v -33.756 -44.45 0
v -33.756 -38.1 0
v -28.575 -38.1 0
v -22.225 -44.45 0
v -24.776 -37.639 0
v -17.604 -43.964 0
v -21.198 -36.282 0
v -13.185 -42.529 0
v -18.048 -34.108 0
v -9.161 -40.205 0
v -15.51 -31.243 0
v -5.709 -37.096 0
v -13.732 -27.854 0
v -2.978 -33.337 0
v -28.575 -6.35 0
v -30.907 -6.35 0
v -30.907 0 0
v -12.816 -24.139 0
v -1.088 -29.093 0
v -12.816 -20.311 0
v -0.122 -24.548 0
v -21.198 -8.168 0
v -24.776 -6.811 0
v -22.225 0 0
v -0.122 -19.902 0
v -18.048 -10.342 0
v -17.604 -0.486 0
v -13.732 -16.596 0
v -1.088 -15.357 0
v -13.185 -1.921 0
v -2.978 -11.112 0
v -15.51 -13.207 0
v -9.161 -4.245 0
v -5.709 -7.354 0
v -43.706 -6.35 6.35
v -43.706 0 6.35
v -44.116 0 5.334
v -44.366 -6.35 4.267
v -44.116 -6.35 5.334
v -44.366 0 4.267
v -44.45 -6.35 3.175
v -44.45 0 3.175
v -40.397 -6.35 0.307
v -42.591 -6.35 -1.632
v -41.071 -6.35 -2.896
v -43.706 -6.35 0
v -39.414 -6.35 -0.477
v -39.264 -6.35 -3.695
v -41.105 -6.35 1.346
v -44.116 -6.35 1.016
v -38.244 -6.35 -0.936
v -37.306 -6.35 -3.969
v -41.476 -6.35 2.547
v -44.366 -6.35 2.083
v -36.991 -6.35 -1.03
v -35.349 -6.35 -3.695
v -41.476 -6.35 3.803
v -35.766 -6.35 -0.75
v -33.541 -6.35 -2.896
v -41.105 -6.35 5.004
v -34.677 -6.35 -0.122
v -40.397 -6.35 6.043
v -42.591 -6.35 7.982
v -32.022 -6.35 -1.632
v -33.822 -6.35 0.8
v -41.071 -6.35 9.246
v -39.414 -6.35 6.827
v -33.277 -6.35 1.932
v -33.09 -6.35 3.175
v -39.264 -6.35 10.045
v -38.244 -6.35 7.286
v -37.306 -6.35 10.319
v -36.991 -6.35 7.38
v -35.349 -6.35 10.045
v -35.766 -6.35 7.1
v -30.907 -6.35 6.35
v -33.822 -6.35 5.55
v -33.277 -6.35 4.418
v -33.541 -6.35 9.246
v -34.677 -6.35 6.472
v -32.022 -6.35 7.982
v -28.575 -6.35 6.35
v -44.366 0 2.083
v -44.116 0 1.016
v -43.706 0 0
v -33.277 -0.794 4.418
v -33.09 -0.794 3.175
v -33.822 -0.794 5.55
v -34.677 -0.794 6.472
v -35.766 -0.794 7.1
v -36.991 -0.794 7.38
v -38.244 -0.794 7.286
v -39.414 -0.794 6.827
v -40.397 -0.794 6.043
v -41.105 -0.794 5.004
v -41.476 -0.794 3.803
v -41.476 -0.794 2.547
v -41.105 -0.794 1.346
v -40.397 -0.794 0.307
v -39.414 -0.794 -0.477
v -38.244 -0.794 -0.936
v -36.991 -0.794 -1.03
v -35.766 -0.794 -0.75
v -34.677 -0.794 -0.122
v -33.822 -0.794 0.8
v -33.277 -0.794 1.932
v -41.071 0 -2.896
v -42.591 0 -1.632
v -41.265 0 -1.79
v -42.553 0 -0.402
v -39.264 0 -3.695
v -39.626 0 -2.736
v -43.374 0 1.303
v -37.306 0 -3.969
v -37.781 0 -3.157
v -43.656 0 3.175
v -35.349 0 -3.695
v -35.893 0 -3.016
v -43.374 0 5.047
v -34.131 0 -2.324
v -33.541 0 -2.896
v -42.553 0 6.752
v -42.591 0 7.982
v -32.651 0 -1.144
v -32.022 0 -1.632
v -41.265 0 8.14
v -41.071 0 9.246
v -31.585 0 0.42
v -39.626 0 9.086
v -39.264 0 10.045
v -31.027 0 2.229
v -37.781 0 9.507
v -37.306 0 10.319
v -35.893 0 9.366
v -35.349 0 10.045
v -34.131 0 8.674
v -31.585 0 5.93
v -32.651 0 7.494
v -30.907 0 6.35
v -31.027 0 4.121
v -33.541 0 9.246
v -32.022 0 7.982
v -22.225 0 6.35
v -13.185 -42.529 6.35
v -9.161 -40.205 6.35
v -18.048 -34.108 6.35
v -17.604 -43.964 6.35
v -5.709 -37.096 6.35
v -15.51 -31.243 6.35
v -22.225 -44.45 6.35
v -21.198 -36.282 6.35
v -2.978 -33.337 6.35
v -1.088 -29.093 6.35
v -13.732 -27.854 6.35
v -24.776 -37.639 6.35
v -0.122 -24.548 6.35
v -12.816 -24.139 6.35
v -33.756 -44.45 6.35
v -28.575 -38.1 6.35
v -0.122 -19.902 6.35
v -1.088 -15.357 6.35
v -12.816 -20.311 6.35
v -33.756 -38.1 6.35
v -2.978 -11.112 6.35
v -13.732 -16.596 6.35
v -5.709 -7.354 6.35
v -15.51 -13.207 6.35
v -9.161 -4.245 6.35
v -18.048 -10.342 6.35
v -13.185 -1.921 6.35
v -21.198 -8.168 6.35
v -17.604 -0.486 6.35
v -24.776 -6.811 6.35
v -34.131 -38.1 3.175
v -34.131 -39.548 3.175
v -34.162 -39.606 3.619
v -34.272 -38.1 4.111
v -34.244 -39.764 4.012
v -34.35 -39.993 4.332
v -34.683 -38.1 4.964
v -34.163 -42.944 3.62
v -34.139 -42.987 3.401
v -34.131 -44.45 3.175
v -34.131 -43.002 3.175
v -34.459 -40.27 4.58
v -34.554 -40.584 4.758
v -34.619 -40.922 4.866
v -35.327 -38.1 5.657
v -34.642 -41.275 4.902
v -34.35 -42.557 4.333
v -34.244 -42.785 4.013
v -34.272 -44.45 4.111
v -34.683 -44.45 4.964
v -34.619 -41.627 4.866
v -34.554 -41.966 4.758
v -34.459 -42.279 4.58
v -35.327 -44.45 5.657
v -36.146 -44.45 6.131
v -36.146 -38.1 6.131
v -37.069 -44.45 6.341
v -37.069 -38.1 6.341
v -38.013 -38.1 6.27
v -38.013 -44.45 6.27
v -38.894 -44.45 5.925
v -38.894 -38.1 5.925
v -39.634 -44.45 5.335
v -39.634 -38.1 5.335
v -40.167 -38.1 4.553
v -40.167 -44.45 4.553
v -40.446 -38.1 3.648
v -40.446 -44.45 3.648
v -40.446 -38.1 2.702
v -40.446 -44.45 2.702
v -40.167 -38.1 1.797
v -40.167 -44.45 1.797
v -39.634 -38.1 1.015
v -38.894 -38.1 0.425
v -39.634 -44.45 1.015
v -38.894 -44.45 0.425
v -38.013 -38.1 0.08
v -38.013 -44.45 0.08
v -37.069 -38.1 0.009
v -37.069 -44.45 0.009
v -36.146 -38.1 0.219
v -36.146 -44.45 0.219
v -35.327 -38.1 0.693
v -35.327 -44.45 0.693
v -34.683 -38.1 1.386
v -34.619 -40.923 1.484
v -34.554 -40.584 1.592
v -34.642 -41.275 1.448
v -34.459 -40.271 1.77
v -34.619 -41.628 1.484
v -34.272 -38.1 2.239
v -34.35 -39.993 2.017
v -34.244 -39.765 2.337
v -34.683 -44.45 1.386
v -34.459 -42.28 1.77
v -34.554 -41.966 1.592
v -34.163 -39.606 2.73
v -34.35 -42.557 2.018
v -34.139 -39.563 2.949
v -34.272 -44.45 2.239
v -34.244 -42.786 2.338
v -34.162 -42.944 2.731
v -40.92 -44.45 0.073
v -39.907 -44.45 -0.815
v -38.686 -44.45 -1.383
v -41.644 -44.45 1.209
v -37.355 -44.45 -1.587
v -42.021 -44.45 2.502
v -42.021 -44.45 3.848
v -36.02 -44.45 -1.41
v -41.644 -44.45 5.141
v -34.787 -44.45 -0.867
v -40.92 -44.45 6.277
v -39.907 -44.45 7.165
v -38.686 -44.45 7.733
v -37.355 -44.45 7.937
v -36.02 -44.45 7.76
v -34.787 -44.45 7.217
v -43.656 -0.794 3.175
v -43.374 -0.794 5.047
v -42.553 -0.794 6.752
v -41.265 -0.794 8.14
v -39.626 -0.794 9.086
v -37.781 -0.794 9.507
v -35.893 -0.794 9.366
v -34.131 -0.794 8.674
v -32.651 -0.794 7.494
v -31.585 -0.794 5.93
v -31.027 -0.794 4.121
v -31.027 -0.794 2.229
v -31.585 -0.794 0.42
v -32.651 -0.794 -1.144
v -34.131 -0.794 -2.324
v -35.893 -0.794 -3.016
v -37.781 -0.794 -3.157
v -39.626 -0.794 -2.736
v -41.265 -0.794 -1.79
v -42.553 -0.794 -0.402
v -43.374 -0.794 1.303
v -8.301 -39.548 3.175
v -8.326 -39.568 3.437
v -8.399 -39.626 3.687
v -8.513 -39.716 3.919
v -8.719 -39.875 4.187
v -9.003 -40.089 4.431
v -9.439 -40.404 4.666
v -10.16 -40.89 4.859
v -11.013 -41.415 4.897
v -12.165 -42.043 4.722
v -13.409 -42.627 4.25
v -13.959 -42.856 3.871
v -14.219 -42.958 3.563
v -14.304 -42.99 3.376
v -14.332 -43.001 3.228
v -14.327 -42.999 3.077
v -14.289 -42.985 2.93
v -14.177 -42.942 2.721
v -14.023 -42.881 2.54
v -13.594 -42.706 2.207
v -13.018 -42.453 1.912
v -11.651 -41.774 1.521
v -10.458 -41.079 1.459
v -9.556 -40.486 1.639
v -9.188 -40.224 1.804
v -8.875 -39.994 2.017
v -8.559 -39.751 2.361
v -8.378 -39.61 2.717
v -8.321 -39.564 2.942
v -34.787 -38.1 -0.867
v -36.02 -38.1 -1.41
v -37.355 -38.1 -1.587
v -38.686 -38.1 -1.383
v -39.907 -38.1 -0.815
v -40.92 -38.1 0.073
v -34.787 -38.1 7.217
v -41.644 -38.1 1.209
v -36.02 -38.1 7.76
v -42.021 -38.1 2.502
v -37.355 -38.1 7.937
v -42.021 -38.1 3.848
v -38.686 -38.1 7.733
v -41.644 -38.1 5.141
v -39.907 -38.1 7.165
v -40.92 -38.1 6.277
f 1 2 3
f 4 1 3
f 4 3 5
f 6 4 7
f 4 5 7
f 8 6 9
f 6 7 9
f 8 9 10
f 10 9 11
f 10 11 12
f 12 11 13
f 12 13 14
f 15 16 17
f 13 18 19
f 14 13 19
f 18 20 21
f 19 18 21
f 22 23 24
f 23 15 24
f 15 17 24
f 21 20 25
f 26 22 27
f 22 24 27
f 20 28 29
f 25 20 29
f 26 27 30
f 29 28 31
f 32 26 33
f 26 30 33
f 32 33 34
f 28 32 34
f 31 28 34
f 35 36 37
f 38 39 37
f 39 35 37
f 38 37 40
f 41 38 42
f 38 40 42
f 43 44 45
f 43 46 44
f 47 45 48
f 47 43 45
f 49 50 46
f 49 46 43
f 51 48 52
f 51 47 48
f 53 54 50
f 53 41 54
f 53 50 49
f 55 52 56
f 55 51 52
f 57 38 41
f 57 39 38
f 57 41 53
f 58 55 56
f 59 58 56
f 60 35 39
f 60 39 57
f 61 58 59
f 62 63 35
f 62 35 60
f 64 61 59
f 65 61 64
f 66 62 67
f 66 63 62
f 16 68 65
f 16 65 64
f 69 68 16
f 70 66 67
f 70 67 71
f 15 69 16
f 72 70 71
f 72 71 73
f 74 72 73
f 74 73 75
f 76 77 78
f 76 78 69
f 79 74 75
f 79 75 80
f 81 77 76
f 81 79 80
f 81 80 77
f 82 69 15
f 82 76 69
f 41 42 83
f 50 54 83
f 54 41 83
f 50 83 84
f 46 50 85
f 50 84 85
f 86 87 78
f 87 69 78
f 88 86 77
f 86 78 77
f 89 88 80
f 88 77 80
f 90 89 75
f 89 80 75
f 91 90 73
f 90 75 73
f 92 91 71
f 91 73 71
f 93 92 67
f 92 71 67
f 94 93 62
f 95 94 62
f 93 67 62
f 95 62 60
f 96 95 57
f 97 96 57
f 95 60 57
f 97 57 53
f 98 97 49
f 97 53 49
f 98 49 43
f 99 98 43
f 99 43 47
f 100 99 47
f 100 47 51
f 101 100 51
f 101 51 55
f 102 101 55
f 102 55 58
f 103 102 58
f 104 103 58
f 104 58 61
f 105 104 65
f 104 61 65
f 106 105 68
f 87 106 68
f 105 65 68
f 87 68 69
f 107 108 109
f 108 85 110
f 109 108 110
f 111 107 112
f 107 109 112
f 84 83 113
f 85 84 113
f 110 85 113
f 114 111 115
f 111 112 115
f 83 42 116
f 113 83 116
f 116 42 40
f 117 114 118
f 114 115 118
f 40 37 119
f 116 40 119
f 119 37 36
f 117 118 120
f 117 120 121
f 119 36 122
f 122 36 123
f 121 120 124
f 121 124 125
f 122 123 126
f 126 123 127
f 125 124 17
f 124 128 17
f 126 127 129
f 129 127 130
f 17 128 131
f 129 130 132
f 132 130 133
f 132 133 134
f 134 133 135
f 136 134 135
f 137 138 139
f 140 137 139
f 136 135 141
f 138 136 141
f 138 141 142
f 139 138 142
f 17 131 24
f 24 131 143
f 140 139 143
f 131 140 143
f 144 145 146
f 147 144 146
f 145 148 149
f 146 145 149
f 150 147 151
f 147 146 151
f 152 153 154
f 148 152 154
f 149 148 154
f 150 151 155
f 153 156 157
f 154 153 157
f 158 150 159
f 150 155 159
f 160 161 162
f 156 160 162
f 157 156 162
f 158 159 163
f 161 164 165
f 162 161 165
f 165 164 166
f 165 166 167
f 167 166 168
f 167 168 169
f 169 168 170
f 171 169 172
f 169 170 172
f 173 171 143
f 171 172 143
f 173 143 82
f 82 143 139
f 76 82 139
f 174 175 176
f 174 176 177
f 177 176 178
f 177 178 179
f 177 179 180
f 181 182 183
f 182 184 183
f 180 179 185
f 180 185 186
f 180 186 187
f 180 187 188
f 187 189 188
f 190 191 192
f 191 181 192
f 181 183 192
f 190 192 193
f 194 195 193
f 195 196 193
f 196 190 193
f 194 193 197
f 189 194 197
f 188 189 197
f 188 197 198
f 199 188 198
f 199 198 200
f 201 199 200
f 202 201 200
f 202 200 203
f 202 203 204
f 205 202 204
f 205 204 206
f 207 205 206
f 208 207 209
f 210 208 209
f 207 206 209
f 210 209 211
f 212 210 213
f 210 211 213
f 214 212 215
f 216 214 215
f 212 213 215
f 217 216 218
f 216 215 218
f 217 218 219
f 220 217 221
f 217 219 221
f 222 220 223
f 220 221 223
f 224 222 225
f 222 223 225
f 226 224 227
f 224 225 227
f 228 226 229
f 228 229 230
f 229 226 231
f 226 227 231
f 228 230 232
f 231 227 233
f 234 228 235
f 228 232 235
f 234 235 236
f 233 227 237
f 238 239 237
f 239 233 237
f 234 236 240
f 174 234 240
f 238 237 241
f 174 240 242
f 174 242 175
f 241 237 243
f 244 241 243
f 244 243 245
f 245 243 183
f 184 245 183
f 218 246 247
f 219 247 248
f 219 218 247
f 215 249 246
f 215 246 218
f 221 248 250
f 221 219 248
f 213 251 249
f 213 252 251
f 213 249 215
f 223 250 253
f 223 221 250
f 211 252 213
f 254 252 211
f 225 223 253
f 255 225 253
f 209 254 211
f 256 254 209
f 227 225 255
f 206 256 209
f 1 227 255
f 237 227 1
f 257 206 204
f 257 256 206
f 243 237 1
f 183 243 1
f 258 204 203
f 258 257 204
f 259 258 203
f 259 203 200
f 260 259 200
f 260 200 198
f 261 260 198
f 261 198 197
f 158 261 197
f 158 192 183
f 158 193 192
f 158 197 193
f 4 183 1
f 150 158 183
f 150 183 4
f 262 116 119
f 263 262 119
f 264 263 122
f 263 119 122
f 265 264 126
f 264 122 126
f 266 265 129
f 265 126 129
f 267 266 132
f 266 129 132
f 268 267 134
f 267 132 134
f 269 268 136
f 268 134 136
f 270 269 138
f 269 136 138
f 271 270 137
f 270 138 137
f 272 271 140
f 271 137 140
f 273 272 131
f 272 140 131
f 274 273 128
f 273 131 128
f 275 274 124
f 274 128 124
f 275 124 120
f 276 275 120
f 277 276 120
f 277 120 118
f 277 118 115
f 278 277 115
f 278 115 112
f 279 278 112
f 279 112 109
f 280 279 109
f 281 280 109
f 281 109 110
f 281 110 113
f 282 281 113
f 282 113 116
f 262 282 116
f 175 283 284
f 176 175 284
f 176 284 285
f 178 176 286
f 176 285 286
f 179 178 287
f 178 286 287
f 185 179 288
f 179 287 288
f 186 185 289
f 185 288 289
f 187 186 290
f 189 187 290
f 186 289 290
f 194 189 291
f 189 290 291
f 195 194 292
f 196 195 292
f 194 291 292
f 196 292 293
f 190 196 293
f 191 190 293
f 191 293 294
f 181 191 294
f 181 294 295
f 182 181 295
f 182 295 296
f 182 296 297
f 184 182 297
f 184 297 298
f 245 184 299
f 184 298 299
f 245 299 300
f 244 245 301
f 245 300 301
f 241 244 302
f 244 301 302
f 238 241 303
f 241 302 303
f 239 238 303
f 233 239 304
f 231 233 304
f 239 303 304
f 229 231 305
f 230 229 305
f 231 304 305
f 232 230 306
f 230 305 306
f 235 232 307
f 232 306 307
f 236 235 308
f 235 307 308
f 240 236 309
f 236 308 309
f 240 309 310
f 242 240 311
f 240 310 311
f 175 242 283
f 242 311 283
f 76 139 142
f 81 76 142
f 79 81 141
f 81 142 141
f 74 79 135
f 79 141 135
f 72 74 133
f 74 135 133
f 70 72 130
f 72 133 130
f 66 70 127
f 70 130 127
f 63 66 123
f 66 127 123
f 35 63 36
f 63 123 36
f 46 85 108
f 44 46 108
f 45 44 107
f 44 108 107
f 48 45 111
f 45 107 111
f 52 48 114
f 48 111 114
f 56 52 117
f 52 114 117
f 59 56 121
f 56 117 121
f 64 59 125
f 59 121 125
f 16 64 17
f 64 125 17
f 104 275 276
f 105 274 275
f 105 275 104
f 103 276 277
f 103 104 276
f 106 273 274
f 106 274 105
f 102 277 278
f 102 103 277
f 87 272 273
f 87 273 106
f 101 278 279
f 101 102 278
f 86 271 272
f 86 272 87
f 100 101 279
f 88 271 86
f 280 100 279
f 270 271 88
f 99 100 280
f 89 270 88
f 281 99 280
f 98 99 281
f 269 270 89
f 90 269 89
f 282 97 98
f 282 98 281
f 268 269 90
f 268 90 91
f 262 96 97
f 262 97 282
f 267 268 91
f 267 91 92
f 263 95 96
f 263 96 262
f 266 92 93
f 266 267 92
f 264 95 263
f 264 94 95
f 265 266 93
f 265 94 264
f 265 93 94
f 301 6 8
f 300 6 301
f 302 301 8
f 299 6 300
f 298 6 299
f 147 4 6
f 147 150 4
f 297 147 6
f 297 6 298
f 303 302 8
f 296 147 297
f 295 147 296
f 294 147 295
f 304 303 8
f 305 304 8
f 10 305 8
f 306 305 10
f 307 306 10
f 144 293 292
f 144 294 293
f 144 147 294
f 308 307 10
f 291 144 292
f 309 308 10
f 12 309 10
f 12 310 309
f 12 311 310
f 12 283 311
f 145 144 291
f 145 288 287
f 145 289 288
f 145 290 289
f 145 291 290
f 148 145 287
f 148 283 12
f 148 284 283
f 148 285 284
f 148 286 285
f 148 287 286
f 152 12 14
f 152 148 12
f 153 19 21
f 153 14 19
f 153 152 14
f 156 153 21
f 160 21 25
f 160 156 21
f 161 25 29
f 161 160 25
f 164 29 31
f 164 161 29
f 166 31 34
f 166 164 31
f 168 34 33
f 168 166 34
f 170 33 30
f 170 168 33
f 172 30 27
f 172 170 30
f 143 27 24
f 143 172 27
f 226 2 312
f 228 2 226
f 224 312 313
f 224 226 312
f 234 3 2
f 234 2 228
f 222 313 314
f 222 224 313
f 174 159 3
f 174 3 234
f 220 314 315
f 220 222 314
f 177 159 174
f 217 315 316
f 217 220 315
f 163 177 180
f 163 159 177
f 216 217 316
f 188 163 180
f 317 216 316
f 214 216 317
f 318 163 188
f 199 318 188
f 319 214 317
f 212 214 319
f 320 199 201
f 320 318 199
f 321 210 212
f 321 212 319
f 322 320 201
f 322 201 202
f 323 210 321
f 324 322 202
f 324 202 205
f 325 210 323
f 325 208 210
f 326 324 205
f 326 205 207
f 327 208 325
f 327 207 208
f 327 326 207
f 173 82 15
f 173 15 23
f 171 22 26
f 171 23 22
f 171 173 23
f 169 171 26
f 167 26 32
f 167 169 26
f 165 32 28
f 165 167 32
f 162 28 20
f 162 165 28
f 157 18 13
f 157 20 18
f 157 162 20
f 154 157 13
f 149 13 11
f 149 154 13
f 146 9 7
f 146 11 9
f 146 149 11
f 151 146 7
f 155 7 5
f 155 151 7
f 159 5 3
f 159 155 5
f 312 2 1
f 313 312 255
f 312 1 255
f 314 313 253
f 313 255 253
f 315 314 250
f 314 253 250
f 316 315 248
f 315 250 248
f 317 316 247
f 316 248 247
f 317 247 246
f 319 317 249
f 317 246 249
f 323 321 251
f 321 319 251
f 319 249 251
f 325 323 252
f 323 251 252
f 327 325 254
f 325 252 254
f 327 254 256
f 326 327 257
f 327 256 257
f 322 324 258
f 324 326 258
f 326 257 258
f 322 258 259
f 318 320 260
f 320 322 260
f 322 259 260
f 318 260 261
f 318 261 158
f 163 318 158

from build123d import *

# Parameters (mm, degrees)
F1_DEPTH       = 44.45
F3_DEPTH       = 12.7
F5_D           = 8.4328
F5_DEPTH       = 6.35
F5_CBORE_D     = 12.7
F5_CBORE_DEPTH = 0.79375
F5_TIP         = 2.5334687141
F6_R           = 3.175
F7_DEPTH       = 25.4
F8_R           = 1.7272
F9_DEPTH       = 38.1


# Not quite as in the source:
# - a feature names something its author has since deleted; it is built from what else it names


with BuildPart() as f1:
    # F0 (on Front) → F1 (new body)
    with BuildSketch(Plane.XZ):
        with BuildLine():
            Line((-30.9068329123, 0), (0, 0))
            Line((0, 0), (0, 6.35))
            Line((0, 6.35), (-30.9068329123, 6.35))
            ThreePointArc((-30.9068329123, 6.35), (-30.3510720769, 4.8055410516), (-30.1625, 3.175))
            ThreePointArc((-30.1625, 3.175), (-30.3510720769, 1.5444589484), (-30.9068329123, 0))
        make_face()
        with BuildLine():
            ThreePointArc((-43.7056670877, 0), (-37.30625, -3.96875), (-30.9068329123, 0))
            Line((-30.9068329123, 0), (-43.7056670877, 0))
        make_face()
        with BuildLine():
            Line((-43.7056670877, 0), (-30.9068329123, 0))
            ThreePointArc((-30.9068329123, 0), (-30.3510720769, 1.5444589484), (-30.1625, 3.175))
            ThreePointArc((-30.1625, 3.175), (-30.3510720769, 4.8055410516), (-30.9068329123, 6.35))
            Line((-30.9068329123, 6.35), (-43.7056670877, 6.35))
            ThreePointArc((-43.7056670877, 6.35), (-44.2614279231, 4.8055410516), (-44.45, 3.175))
            ThreePointArc((-44.45, 3.175), (-44.2614279231, 1.5444589484), (-43.7056670877, 0))
        make_face()
        with BuildLine():
            Line((-43.7056670877, 6.35), (-30.9068329123, 6.35))
            ThreePointArc((-30.9068329123, 6.35), (-37.30625, 10.31875), (-43.7056670877, 6.35))
        make_face()
    extrude(amount=F1_DEPTH)

    # F2 (on face) → F3 (intersect, symmetric)
    with BuildSketch(Plane.XY.offset(6.35)):
        with BuildLine():
            Line((-22.225, 0), (-44.45, 0))
            Line((-44.45, 0), (-44.45, -6.35))
            Line((-44.45, -6.35), (-28.575, -6.35))
            ThreePointArc((-28.575, -6.35), (-12.7, -22.225), (-28.575, -38.1))
            Line((-28.575, -38.1), (-44.45, -38.1))
            Line((-44.45, -38.1), (-44.45, -44.45))
            Line((-44.45, -44.45), (-22.225, -44.45))
            ThreePointArc((-22.225, -44.45), (0, -22.225), (-22.225, 0))
        make_face()
    extrude(amount=F3_DEPTH, both=True, mode=Mode.INTERSECT)

    # F5
    with Locations(Plane(origin=(0, 0, 0), x_dir=(-1, 0, 0), z_dir=(0, 1, 0))):
        with Locations((37.30625, 3.175)):
            CounterBoreHole(F5_D / 2, F5_CBORE_D / 2, F5_CBORE_DEPTH, depth=F5_DEPTH)
            with Locations((0, 0, -(F5_DEPTH + F5_TIP / 2))):  # 118° drill point
                Cone(0, F5_D / 2, F5_TIP, mode=Mode.SUBTRACT)

    # F6 (on face) → F7 (cut)
    with BuildSketch(Plane.XZ.offset(44.45)):
        with BuildLine():
            ThreePointArc((-33.7564920857, 0), (-42.06875, 3.175), (-33.7564920857, 6.35))
            Line((-33.7564920857, 6.35), (-30.9068329123, 6.35))
            ThreePointArc((-30.9068329123, 6.35), (-44.45, 3.175), (-30.9068329123, 0))
            Line((-30.9068329123, 0), (-33.7564920857, 0))
        make_face()
        with Locations((-37.30625, 3.175)):
            Circle(F6_R)
    extrude(amount=-F7_DEPTH, mode=Mode.SUBTRACT)

    # F8 (on Right) → F9 (cut)
    with BuildSketch(Plane.YZ):
        with Locations((-41.275, 3.175)):
            Circle(F8_R)
    extrude(amount=-F9_DEPTH, mode=Mode.SUBTRACT)


solid = f1.part
